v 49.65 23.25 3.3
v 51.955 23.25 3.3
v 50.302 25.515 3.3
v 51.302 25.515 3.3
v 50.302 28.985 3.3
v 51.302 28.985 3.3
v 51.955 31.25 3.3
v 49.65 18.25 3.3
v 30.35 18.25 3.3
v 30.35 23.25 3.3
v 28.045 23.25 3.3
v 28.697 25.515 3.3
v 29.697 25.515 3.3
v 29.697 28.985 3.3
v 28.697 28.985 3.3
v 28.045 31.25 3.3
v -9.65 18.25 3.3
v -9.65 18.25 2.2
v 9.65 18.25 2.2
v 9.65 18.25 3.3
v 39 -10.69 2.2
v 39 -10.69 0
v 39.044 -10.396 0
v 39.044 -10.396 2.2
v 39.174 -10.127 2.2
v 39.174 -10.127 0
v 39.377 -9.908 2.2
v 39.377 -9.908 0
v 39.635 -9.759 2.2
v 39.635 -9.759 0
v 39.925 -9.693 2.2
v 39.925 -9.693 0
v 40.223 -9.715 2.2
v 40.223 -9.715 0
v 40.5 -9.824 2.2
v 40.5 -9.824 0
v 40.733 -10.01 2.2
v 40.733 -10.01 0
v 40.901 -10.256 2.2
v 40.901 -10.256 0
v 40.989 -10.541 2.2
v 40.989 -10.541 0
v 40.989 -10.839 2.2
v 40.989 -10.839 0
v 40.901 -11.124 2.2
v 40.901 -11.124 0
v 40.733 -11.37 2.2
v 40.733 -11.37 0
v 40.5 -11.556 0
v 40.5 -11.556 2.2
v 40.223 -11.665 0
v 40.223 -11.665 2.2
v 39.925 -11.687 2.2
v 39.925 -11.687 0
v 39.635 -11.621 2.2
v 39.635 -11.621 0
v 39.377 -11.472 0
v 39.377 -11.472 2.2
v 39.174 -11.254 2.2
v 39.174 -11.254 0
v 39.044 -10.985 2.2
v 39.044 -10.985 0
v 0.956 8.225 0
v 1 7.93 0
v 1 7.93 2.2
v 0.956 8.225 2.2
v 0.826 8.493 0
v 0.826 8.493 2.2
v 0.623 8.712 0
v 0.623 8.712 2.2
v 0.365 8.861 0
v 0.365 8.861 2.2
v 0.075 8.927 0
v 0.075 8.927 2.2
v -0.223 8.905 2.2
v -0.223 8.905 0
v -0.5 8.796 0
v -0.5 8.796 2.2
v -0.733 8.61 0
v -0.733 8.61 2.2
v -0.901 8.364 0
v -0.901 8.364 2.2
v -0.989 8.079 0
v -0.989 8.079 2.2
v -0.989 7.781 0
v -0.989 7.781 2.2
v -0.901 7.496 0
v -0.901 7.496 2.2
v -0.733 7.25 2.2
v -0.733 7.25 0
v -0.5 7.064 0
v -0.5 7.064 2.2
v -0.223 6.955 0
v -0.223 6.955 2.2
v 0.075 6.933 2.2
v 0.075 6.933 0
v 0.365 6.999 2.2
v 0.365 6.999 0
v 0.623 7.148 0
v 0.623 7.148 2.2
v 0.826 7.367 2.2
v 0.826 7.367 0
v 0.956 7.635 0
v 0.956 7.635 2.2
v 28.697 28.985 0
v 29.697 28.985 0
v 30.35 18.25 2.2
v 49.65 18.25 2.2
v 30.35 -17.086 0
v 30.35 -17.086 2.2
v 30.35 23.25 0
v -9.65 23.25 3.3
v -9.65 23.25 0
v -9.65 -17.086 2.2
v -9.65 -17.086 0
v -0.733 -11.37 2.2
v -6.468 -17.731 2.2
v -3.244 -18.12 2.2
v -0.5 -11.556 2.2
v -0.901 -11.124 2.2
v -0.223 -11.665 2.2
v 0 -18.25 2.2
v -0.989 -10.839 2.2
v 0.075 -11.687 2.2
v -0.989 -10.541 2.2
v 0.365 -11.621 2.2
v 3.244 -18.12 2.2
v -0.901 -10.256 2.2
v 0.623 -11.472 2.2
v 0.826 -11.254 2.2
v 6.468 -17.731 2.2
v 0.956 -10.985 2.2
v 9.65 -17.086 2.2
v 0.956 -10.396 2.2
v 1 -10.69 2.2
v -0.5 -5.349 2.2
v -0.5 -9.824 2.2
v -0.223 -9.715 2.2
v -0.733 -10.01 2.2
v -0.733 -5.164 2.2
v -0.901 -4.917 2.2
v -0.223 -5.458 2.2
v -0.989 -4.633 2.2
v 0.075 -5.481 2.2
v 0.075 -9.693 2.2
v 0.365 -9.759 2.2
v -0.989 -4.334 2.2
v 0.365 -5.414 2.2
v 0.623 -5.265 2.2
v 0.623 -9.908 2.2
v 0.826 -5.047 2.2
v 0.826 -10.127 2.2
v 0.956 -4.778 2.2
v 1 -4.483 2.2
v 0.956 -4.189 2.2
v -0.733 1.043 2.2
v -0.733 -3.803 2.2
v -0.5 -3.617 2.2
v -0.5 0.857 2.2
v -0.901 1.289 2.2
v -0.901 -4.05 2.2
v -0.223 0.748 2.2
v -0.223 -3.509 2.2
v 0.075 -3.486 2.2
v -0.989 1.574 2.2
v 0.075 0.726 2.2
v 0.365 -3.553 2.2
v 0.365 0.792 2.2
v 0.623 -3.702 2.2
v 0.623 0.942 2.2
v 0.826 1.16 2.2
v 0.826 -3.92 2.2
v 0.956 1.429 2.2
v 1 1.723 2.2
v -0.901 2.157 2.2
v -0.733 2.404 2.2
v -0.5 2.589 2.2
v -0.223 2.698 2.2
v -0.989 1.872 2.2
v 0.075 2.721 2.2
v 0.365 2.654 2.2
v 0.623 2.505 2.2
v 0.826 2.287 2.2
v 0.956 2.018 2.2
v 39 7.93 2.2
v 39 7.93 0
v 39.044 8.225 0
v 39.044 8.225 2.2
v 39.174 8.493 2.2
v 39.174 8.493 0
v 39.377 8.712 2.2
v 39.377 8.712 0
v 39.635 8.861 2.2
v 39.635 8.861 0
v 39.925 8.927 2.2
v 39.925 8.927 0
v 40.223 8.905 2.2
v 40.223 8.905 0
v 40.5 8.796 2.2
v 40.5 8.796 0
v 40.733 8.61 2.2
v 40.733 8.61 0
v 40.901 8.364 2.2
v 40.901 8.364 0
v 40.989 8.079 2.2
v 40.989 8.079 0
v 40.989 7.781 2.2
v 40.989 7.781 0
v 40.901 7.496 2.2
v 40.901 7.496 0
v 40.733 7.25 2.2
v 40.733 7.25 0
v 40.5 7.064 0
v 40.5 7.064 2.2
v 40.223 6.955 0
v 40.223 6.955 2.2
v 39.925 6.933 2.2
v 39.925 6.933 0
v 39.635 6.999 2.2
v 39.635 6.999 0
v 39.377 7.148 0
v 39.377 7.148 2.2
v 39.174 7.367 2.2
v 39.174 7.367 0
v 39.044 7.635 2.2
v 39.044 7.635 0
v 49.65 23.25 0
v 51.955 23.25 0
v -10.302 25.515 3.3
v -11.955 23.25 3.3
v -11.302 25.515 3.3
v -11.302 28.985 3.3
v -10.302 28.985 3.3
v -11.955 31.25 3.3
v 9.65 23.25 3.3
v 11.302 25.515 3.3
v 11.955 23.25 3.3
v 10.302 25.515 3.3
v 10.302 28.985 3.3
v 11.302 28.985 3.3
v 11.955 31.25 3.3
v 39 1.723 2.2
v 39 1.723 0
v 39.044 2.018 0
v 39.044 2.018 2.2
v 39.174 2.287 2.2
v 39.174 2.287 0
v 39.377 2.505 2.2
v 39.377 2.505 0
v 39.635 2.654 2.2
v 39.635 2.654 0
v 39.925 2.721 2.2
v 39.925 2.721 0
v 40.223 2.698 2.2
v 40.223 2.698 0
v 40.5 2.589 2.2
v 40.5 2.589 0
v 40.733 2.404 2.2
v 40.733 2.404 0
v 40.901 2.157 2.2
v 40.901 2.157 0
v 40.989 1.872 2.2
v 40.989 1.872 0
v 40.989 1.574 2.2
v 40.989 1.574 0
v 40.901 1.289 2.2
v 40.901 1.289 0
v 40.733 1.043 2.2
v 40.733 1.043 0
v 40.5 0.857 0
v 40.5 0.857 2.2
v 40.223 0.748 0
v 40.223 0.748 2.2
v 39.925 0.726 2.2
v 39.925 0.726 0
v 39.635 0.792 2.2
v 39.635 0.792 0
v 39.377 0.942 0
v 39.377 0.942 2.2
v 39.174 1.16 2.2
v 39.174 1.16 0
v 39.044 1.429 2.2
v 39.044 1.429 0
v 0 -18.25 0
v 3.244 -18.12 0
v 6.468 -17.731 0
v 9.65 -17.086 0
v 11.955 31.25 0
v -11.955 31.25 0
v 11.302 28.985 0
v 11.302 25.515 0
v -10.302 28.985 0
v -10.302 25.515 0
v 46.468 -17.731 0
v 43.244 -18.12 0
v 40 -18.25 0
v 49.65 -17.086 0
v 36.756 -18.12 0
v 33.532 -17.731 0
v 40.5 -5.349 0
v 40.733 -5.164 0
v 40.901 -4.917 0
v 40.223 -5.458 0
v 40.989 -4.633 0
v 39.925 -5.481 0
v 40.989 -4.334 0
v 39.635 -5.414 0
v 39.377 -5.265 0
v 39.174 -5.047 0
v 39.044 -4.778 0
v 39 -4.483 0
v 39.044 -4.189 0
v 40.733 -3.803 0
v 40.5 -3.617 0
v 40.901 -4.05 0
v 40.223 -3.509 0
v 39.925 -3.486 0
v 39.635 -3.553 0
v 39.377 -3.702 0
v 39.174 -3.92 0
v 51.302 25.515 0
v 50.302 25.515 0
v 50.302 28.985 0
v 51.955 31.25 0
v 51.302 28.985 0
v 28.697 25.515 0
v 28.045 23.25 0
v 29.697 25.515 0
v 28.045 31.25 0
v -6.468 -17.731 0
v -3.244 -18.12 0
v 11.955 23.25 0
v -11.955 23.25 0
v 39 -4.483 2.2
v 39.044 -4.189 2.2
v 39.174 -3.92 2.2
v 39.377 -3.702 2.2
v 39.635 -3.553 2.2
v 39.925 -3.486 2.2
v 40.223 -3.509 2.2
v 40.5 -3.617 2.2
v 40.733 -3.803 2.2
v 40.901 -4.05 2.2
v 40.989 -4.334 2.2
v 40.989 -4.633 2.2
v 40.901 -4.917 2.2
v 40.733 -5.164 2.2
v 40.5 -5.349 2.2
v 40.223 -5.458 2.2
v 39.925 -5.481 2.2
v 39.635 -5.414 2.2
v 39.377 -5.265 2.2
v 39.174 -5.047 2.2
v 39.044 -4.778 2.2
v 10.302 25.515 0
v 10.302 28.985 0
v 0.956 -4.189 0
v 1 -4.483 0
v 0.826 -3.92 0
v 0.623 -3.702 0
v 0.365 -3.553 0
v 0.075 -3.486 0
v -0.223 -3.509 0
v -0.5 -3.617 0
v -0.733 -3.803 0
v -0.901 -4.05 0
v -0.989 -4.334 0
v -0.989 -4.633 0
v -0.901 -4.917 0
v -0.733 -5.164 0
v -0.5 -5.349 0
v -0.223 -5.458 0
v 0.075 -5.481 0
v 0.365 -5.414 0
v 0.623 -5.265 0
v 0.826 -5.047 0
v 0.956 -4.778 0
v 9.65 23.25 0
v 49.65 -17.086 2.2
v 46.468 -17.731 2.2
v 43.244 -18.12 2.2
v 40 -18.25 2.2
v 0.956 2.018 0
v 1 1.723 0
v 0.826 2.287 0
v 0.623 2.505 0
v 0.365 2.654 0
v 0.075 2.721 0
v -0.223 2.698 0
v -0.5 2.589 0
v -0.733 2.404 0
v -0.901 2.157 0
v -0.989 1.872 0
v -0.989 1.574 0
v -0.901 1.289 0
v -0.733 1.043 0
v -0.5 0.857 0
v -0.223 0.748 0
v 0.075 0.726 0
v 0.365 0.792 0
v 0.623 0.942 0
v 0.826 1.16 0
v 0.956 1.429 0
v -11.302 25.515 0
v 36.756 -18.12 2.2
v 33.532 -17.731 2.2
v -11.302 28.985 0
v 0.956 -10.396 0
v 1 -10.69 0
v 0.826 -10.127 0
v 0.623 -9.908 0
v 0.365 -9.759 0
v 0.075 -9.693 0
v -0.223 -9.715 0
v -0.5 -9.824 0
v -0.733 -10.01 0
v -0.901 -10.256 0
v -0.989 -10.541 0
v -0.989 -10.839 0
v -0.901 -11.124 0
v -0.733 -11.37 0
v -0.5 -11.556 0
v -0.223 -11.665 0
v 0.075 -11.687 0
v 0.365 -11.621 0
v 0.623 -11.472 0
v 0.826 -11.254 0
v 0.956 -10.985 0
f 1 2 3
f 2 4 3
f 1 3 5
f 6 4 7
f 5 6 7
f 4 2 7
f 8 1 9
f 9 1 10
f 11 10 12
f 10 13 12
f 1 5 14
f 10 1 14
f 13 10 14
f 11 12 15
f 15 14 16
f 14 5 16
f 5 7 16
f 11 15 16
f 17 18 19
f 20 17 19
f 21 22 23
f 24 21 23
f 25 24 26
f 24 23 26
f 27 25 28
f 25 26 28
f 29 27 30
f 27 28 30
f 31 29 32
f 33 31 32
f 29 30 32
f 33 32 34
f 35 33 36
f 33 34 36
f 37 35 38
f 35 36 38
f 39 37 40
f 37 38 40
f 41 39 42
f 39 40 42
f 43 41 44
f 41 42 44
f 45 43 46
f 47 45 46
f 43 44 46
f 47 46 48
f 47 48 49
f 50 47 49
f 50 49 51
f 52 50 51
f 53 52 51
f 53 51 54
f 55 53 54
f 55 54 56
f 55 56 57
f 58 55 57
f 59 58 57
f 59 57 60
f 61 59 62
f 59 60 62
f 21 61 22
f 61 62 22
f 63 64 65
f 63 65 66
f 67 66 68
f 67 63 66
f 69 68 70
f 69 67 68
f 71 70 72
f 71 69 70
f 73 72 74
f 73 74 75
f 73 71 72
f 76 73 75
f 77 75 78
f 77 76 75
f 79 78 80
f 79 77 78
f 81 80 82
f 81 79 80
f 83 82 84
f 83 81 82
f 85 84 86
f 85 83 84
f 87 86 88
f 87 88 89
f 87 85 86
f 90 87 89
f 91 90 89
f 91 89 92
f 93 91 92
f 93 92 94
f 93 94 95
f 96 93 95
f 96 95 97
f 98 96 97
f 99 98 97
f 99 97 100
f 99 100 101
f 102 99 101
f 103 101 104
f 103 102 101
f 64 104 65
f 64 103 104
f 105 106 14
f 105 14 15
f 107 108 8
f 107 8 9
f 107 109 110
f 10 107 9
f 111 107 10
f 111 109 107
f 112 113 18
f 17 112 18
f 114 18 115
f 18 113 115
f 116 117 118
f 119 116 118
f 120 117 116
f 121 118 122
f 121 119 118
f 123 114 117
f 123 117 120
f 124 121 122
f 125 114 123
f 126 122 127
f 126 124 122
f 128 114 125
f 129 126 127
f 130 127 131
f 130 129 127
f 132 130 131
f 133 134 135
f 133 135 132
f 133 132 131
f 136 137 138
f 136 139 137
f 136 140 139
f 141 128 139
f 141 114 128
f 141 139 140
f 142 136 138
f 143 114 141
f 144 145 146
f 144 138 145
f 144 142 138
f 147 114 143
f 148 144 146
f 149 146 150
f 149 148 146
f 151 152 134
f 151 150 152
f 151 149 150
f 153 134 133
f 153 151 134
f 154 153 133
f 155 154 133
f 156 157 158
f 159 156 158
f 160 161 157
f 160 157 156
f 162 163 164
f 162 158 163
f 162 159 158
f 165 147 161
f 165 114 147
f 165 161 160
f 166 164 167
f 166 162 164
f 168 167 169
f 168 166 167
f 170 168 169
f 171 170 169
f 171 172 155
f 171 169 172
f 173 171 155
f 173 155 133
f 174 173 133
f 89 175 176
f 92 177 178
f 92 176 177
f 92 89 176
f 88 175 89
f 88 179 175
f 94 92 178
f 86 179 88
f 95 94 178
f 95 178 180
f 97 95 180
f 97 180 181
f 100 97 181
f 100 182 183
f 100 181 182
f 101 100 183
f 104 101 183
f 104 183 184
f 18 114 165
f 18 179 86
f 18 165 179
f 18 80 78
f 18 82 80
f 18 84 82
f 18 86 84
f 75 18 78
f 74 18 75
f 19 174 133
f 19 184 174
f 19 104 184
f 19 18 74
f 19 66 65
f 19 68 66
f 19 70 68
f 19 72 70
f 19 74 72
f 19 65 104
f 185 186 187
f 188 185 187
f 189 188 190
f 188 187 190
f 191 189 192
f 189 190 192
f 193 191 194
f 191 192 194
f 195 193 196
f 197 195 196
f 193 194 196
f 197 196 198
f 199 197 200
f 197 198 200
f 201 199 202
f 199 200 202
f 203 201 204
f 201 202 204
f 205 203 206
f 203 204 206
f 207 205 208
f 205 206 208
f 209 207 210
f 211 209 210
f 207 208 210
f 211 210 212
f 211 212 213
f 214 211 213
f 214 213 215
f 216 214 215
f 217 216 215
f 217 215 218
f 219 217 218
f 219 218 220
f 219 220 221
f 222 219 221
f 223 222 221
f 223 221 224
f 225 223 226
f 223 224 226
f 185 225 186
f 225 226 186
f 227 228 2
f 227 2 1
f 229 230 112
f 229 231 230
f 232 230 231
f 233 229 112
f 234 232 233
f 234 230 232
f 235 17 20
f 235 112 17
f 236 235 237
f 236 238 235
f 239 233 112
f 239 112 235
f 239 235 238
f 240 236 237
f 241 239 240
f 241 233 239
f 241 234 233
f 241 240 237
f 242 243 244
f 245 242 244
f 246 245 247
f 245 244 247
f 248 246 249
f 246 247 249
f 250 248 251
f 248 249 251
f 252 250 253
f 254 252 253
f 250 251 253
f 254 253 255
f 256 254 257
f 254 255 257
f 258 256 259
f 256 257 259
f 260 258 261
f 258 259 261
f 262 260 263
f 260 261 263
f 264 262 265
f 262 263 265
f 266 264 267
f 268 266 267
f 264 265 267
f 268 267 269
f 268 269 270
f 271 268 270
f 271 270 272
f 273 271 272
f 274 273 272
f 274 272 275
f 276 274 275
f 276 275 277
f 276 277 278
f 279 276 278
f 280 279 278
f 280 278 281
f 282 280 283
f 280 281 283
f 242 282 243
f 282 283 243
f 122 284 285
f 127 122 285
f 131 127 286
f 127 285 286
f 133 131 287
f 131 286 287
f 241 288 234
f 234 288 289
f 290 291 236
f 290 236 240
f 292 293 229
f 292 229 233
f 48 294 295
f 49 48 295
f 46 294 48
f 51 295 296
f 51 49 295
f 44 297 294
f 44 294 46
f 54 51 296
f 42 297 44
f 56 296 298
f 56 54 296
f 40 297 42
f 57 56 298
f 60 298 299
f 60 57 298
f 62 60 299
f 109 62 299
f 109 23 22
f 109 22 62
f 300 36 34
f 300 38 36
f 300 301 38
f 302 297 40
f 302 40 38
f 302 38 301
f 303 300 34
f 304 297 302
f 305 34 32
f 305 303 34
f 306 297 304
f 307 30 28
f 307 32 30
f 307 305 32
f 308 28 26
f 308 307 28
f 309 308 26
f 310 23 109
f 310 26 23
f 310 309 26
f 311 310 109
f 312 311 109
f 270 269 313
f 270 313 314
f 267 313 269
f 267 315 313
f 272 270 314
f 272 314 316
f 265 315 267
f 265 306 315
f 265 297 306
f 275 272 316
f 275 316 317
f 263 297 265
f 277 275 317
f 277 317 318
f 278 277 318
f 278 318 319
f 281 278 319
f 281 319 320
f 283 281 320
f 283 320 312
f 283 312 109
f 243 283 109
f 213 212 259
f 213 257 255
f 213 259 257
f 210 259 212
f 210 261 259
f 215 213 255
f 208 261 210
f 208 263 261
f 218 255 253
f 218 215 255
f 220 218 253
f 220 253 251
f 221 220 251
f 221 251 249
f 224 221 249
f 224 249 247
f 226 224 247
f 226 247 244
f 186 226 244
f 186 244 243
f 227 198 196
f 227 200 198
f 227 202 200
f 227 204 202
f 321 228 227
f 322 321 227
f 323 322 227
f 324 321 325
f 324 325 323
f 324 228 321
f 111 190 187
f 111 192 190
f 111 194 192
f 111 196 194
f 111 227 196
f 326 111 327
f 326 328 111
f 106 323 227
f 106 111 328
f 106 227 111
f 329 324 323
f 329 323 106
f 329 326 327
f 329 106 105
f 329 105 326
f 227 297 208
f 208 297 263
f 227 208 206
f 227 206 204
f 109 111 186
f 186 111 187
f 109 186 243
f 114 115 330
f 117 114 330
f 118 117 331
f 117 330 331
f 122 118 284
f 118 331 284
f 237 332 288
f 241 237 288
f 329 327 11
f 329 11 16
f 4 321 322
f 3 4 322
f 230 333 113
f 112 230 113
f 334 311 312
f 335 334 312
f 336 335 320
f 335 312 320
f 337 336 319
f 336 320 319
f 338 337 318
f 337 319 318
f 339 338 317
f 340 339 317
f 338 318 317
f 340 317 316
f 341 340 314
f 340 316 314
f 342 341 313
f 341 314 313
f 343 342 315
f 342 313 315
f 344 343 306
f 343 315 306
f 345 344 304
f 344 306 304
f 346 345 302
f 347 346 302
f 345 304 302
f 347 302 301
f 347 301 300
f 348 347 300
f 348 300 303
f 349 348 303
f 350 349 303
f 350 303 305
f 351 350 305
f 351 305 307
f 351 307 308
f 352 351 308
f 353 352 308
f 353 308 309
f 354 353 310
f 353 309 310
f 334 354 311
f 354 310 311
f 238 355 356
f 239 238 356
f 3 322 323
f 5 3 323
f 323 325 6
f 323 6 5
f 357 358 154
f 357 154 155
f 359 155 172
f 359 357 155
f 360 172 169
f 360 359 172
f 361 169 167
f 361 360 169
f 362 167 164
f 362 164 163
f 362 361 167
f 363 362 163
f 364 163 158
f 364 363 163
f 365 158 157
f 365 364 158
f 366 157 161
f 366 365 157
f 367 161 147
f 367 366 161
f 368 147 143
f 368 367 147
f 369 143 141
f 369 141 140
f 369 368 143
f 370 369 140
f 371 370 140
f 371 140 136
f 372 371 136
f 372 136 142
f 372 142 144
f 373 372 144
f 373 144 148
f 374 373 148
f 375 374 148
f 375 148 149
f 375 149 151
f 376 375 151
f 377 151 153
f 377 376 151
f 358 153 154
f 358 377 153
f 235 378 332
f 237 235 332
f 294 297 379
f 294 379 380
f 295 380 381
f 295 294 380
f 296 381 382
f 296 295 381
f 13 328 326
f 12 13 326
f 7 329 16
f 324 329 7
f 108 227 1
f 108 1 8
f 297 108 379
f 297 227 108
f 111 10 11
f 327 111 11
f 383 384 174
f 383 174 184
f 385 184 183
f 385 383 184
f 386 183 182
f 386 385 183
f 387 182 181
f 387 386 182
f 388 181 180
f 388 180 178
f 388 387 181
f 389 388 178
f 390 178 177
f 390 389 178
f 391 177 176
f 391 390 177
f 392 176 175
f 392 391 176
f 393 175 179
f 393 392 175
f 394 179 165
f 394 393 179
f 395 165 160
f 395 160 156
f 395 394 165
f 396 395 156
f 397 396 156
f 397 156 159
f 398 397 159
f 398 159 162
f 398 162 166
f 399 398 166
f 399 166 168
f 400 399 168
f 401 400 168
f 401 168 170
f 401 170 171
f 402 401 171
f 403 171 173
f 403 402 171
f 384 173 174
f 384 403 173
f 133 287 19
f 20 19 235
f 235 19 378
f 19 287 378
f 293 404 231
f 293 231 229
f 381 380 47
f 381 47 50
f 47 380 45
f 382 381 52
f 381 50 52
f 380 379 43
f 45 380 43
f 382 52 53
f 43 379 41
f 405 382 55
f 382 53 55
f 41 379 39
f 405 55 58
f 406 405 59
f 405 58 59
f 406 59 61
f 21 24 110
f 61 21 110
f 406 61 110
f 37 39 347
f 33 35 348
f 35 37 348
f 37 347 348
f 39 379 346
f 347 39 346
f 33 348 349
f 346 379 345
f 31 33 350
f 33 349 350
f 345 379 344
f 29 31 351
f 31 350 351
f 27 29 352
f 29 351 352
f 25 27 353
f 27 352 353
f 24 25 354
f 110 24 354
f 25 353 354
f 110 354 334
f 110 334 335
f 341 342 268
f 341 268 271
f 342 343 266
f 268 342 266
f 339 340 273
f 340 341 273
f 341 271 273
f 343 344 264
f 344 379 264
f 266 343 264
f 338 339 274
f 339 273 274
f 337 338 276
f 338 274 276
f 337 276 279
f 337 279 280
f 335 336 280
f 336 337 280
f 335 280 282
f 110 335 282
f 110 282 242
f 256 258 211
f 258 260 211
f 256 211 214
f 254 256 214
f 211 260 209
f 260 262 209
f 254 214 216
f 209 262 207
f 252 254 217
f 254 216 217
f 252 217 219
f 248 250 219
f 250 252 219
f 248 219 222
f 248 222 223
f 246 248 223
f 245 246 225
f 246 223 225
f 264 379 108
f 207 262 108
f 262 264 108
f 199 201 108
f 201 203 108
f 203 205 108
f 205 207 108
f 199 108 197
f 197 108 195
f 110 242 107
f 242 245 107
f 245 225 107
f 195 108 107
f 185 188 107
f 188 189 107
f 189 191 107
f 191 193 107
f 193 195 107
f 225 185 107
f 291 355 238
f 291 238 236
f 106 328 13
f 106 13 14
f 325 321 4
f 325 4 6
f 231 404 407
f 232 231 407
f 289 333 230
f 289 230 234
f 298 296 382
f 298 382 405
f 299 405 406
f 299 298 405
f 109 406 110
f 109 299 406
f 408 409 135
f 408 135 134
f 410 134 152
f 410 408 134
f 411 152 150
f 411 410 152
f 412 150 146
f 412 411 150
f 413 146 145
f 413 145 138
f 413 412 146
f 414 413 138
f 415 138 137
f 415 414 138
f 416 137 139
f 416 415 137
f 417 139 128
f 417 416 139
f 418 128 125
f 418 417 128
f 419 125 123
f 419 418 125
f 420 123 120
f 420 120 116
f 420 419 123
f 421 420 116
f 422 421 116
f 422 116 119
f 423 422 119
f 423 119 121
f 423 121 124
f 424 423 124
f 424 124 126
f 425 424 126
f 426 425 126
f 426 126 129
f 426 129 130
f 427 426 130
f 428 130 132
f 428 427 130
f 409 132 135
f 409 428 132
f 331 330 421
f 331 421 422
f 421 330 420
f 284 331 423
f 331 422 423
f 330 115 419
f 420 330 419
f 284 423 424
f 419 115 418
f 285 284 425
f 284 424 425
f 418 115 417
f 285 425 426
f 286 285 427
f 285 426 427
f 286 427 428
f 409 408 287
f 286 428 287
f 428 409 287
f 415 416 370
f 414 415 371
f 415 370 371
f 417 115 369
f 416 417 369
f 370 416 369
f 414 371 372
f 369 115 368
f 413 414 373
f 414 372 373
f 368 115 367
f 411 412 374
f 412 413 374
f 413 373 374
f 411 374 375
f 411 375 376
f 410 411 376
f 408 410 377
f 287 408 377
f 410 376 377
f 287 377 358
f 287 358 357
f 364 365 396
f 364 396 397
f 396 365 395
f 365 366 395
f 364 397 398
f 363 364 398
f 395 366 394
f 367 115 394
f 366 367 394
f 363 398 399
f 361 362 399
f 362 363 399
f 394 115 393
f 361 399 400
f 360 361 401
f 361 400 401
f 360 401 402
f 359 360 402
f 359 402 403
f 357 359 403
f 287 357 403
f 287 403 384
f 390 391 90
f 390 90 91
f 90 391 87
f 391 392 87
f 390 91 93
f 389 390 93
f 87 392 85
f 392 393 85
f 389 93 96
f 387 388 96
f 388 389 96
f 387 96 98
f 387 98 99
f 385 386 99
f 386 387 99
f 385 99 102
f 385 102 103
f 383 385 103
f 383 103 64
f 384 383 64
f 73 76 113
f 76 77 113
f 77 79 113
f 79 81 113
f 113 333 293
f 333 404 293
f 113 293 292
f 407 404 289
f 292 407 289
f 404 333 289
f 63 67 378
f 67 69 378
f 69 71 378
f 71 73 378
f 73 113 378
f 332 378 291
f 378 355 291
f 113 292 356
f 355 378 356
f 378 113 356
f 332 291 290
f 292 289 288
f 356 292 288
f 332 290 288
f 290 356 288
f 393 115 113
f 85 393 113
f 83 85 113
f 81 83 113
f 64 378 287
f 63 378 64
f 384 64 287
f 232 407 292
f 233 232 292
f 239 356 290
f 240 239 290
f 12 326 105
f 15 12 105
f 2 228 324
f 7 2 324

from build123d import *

# Parameters (mm, degrees)
F0_R     = 1
F1_DEPTH = 2.2
F0_W     = 17.25
F0_H     = 8
F0_W_2   = 1.025
F0_W_3   = 2.305
F0_W_4   = 1
F0_H_2   = 3.470716
F2_DEPTH = 3.3


with BuildPart() as f1:
    # F0 (on Top) → F1 (new body)
    with BuildSketch(Plane.XY):
        with BuildLine():
            ThreePointArc((-9.65, -17.085604), (-4.859998, -17.957849), (0, -18.25))
            ThreePointArc((0, -18.25), (4.859998, -17.957849), (9.65, -17.085604))
            Line((9.65, -17.085604), (9.65, 18.25))
            Line((9.65, 18.25), (-9.65, 18.25))
            Line((-9.65, 18.25), (-9.65, -17.085604))
        make_face()
        with Locations((0, -10.69029)):
            Circle(F0_R, mode=Mode.SUBTRACT)
        with Locations((0, -4.48347)):
            Circle(F0_R, mode=Mode.SUBTRACT)
        with Locations((0, 1.72335)):
            Circle(F0_R, mode=Mode.SUBTRACT)
        with Locations((0, 7.93017)):
            Circle(F0_R, mode=Mode.SUBTRACT)
    extrude(amount=F1_DEPTH)

    # F0 (on Top) → F2 (join)
    with BuildSketch(Plane.XY):
        with Locations((0, 27.25)):
            Rectangle(F0_W, F0_H)
        Polygon((-9.65, 23.25), (-9.65, 18.25), (9.65, 18.25), (9.65, 23.25), (8.625, 23.25), (-8.625, 23.25), align=None)
        with Locations((-9.1375, 27.25)):
            Rectangle(F0_W_2, F0_H)
        with Locations((-10.8025, 27.25)):
            Rectangle(F0_W_3, F0_H)
        with Locations((-10.8025, 27.25)):
            Rectangle(F0_W_4, F0_H_2, mode=Mode.SUBTRACT)
        with Locations((9.1375, 27.25)):
            Rectangle(F0_W_2, F0_H)
        with Locations((10.8025, 27.25)):
            Rectangle(F0_W_3, F0_H)
        with Locations((10.8025, 27.25)):
            Rectangle(F0_W_4, F0_H_2, mode=Mode.SUBTRACT)
    extrude(amount=F2_DEPTH)


with BuildPart() as f4_1:
    # F4: instance of F1
    add(f1.part.mirror(Plane.YZ.offset(20)))


solid = Compound([f1.part, f4_1.part])
